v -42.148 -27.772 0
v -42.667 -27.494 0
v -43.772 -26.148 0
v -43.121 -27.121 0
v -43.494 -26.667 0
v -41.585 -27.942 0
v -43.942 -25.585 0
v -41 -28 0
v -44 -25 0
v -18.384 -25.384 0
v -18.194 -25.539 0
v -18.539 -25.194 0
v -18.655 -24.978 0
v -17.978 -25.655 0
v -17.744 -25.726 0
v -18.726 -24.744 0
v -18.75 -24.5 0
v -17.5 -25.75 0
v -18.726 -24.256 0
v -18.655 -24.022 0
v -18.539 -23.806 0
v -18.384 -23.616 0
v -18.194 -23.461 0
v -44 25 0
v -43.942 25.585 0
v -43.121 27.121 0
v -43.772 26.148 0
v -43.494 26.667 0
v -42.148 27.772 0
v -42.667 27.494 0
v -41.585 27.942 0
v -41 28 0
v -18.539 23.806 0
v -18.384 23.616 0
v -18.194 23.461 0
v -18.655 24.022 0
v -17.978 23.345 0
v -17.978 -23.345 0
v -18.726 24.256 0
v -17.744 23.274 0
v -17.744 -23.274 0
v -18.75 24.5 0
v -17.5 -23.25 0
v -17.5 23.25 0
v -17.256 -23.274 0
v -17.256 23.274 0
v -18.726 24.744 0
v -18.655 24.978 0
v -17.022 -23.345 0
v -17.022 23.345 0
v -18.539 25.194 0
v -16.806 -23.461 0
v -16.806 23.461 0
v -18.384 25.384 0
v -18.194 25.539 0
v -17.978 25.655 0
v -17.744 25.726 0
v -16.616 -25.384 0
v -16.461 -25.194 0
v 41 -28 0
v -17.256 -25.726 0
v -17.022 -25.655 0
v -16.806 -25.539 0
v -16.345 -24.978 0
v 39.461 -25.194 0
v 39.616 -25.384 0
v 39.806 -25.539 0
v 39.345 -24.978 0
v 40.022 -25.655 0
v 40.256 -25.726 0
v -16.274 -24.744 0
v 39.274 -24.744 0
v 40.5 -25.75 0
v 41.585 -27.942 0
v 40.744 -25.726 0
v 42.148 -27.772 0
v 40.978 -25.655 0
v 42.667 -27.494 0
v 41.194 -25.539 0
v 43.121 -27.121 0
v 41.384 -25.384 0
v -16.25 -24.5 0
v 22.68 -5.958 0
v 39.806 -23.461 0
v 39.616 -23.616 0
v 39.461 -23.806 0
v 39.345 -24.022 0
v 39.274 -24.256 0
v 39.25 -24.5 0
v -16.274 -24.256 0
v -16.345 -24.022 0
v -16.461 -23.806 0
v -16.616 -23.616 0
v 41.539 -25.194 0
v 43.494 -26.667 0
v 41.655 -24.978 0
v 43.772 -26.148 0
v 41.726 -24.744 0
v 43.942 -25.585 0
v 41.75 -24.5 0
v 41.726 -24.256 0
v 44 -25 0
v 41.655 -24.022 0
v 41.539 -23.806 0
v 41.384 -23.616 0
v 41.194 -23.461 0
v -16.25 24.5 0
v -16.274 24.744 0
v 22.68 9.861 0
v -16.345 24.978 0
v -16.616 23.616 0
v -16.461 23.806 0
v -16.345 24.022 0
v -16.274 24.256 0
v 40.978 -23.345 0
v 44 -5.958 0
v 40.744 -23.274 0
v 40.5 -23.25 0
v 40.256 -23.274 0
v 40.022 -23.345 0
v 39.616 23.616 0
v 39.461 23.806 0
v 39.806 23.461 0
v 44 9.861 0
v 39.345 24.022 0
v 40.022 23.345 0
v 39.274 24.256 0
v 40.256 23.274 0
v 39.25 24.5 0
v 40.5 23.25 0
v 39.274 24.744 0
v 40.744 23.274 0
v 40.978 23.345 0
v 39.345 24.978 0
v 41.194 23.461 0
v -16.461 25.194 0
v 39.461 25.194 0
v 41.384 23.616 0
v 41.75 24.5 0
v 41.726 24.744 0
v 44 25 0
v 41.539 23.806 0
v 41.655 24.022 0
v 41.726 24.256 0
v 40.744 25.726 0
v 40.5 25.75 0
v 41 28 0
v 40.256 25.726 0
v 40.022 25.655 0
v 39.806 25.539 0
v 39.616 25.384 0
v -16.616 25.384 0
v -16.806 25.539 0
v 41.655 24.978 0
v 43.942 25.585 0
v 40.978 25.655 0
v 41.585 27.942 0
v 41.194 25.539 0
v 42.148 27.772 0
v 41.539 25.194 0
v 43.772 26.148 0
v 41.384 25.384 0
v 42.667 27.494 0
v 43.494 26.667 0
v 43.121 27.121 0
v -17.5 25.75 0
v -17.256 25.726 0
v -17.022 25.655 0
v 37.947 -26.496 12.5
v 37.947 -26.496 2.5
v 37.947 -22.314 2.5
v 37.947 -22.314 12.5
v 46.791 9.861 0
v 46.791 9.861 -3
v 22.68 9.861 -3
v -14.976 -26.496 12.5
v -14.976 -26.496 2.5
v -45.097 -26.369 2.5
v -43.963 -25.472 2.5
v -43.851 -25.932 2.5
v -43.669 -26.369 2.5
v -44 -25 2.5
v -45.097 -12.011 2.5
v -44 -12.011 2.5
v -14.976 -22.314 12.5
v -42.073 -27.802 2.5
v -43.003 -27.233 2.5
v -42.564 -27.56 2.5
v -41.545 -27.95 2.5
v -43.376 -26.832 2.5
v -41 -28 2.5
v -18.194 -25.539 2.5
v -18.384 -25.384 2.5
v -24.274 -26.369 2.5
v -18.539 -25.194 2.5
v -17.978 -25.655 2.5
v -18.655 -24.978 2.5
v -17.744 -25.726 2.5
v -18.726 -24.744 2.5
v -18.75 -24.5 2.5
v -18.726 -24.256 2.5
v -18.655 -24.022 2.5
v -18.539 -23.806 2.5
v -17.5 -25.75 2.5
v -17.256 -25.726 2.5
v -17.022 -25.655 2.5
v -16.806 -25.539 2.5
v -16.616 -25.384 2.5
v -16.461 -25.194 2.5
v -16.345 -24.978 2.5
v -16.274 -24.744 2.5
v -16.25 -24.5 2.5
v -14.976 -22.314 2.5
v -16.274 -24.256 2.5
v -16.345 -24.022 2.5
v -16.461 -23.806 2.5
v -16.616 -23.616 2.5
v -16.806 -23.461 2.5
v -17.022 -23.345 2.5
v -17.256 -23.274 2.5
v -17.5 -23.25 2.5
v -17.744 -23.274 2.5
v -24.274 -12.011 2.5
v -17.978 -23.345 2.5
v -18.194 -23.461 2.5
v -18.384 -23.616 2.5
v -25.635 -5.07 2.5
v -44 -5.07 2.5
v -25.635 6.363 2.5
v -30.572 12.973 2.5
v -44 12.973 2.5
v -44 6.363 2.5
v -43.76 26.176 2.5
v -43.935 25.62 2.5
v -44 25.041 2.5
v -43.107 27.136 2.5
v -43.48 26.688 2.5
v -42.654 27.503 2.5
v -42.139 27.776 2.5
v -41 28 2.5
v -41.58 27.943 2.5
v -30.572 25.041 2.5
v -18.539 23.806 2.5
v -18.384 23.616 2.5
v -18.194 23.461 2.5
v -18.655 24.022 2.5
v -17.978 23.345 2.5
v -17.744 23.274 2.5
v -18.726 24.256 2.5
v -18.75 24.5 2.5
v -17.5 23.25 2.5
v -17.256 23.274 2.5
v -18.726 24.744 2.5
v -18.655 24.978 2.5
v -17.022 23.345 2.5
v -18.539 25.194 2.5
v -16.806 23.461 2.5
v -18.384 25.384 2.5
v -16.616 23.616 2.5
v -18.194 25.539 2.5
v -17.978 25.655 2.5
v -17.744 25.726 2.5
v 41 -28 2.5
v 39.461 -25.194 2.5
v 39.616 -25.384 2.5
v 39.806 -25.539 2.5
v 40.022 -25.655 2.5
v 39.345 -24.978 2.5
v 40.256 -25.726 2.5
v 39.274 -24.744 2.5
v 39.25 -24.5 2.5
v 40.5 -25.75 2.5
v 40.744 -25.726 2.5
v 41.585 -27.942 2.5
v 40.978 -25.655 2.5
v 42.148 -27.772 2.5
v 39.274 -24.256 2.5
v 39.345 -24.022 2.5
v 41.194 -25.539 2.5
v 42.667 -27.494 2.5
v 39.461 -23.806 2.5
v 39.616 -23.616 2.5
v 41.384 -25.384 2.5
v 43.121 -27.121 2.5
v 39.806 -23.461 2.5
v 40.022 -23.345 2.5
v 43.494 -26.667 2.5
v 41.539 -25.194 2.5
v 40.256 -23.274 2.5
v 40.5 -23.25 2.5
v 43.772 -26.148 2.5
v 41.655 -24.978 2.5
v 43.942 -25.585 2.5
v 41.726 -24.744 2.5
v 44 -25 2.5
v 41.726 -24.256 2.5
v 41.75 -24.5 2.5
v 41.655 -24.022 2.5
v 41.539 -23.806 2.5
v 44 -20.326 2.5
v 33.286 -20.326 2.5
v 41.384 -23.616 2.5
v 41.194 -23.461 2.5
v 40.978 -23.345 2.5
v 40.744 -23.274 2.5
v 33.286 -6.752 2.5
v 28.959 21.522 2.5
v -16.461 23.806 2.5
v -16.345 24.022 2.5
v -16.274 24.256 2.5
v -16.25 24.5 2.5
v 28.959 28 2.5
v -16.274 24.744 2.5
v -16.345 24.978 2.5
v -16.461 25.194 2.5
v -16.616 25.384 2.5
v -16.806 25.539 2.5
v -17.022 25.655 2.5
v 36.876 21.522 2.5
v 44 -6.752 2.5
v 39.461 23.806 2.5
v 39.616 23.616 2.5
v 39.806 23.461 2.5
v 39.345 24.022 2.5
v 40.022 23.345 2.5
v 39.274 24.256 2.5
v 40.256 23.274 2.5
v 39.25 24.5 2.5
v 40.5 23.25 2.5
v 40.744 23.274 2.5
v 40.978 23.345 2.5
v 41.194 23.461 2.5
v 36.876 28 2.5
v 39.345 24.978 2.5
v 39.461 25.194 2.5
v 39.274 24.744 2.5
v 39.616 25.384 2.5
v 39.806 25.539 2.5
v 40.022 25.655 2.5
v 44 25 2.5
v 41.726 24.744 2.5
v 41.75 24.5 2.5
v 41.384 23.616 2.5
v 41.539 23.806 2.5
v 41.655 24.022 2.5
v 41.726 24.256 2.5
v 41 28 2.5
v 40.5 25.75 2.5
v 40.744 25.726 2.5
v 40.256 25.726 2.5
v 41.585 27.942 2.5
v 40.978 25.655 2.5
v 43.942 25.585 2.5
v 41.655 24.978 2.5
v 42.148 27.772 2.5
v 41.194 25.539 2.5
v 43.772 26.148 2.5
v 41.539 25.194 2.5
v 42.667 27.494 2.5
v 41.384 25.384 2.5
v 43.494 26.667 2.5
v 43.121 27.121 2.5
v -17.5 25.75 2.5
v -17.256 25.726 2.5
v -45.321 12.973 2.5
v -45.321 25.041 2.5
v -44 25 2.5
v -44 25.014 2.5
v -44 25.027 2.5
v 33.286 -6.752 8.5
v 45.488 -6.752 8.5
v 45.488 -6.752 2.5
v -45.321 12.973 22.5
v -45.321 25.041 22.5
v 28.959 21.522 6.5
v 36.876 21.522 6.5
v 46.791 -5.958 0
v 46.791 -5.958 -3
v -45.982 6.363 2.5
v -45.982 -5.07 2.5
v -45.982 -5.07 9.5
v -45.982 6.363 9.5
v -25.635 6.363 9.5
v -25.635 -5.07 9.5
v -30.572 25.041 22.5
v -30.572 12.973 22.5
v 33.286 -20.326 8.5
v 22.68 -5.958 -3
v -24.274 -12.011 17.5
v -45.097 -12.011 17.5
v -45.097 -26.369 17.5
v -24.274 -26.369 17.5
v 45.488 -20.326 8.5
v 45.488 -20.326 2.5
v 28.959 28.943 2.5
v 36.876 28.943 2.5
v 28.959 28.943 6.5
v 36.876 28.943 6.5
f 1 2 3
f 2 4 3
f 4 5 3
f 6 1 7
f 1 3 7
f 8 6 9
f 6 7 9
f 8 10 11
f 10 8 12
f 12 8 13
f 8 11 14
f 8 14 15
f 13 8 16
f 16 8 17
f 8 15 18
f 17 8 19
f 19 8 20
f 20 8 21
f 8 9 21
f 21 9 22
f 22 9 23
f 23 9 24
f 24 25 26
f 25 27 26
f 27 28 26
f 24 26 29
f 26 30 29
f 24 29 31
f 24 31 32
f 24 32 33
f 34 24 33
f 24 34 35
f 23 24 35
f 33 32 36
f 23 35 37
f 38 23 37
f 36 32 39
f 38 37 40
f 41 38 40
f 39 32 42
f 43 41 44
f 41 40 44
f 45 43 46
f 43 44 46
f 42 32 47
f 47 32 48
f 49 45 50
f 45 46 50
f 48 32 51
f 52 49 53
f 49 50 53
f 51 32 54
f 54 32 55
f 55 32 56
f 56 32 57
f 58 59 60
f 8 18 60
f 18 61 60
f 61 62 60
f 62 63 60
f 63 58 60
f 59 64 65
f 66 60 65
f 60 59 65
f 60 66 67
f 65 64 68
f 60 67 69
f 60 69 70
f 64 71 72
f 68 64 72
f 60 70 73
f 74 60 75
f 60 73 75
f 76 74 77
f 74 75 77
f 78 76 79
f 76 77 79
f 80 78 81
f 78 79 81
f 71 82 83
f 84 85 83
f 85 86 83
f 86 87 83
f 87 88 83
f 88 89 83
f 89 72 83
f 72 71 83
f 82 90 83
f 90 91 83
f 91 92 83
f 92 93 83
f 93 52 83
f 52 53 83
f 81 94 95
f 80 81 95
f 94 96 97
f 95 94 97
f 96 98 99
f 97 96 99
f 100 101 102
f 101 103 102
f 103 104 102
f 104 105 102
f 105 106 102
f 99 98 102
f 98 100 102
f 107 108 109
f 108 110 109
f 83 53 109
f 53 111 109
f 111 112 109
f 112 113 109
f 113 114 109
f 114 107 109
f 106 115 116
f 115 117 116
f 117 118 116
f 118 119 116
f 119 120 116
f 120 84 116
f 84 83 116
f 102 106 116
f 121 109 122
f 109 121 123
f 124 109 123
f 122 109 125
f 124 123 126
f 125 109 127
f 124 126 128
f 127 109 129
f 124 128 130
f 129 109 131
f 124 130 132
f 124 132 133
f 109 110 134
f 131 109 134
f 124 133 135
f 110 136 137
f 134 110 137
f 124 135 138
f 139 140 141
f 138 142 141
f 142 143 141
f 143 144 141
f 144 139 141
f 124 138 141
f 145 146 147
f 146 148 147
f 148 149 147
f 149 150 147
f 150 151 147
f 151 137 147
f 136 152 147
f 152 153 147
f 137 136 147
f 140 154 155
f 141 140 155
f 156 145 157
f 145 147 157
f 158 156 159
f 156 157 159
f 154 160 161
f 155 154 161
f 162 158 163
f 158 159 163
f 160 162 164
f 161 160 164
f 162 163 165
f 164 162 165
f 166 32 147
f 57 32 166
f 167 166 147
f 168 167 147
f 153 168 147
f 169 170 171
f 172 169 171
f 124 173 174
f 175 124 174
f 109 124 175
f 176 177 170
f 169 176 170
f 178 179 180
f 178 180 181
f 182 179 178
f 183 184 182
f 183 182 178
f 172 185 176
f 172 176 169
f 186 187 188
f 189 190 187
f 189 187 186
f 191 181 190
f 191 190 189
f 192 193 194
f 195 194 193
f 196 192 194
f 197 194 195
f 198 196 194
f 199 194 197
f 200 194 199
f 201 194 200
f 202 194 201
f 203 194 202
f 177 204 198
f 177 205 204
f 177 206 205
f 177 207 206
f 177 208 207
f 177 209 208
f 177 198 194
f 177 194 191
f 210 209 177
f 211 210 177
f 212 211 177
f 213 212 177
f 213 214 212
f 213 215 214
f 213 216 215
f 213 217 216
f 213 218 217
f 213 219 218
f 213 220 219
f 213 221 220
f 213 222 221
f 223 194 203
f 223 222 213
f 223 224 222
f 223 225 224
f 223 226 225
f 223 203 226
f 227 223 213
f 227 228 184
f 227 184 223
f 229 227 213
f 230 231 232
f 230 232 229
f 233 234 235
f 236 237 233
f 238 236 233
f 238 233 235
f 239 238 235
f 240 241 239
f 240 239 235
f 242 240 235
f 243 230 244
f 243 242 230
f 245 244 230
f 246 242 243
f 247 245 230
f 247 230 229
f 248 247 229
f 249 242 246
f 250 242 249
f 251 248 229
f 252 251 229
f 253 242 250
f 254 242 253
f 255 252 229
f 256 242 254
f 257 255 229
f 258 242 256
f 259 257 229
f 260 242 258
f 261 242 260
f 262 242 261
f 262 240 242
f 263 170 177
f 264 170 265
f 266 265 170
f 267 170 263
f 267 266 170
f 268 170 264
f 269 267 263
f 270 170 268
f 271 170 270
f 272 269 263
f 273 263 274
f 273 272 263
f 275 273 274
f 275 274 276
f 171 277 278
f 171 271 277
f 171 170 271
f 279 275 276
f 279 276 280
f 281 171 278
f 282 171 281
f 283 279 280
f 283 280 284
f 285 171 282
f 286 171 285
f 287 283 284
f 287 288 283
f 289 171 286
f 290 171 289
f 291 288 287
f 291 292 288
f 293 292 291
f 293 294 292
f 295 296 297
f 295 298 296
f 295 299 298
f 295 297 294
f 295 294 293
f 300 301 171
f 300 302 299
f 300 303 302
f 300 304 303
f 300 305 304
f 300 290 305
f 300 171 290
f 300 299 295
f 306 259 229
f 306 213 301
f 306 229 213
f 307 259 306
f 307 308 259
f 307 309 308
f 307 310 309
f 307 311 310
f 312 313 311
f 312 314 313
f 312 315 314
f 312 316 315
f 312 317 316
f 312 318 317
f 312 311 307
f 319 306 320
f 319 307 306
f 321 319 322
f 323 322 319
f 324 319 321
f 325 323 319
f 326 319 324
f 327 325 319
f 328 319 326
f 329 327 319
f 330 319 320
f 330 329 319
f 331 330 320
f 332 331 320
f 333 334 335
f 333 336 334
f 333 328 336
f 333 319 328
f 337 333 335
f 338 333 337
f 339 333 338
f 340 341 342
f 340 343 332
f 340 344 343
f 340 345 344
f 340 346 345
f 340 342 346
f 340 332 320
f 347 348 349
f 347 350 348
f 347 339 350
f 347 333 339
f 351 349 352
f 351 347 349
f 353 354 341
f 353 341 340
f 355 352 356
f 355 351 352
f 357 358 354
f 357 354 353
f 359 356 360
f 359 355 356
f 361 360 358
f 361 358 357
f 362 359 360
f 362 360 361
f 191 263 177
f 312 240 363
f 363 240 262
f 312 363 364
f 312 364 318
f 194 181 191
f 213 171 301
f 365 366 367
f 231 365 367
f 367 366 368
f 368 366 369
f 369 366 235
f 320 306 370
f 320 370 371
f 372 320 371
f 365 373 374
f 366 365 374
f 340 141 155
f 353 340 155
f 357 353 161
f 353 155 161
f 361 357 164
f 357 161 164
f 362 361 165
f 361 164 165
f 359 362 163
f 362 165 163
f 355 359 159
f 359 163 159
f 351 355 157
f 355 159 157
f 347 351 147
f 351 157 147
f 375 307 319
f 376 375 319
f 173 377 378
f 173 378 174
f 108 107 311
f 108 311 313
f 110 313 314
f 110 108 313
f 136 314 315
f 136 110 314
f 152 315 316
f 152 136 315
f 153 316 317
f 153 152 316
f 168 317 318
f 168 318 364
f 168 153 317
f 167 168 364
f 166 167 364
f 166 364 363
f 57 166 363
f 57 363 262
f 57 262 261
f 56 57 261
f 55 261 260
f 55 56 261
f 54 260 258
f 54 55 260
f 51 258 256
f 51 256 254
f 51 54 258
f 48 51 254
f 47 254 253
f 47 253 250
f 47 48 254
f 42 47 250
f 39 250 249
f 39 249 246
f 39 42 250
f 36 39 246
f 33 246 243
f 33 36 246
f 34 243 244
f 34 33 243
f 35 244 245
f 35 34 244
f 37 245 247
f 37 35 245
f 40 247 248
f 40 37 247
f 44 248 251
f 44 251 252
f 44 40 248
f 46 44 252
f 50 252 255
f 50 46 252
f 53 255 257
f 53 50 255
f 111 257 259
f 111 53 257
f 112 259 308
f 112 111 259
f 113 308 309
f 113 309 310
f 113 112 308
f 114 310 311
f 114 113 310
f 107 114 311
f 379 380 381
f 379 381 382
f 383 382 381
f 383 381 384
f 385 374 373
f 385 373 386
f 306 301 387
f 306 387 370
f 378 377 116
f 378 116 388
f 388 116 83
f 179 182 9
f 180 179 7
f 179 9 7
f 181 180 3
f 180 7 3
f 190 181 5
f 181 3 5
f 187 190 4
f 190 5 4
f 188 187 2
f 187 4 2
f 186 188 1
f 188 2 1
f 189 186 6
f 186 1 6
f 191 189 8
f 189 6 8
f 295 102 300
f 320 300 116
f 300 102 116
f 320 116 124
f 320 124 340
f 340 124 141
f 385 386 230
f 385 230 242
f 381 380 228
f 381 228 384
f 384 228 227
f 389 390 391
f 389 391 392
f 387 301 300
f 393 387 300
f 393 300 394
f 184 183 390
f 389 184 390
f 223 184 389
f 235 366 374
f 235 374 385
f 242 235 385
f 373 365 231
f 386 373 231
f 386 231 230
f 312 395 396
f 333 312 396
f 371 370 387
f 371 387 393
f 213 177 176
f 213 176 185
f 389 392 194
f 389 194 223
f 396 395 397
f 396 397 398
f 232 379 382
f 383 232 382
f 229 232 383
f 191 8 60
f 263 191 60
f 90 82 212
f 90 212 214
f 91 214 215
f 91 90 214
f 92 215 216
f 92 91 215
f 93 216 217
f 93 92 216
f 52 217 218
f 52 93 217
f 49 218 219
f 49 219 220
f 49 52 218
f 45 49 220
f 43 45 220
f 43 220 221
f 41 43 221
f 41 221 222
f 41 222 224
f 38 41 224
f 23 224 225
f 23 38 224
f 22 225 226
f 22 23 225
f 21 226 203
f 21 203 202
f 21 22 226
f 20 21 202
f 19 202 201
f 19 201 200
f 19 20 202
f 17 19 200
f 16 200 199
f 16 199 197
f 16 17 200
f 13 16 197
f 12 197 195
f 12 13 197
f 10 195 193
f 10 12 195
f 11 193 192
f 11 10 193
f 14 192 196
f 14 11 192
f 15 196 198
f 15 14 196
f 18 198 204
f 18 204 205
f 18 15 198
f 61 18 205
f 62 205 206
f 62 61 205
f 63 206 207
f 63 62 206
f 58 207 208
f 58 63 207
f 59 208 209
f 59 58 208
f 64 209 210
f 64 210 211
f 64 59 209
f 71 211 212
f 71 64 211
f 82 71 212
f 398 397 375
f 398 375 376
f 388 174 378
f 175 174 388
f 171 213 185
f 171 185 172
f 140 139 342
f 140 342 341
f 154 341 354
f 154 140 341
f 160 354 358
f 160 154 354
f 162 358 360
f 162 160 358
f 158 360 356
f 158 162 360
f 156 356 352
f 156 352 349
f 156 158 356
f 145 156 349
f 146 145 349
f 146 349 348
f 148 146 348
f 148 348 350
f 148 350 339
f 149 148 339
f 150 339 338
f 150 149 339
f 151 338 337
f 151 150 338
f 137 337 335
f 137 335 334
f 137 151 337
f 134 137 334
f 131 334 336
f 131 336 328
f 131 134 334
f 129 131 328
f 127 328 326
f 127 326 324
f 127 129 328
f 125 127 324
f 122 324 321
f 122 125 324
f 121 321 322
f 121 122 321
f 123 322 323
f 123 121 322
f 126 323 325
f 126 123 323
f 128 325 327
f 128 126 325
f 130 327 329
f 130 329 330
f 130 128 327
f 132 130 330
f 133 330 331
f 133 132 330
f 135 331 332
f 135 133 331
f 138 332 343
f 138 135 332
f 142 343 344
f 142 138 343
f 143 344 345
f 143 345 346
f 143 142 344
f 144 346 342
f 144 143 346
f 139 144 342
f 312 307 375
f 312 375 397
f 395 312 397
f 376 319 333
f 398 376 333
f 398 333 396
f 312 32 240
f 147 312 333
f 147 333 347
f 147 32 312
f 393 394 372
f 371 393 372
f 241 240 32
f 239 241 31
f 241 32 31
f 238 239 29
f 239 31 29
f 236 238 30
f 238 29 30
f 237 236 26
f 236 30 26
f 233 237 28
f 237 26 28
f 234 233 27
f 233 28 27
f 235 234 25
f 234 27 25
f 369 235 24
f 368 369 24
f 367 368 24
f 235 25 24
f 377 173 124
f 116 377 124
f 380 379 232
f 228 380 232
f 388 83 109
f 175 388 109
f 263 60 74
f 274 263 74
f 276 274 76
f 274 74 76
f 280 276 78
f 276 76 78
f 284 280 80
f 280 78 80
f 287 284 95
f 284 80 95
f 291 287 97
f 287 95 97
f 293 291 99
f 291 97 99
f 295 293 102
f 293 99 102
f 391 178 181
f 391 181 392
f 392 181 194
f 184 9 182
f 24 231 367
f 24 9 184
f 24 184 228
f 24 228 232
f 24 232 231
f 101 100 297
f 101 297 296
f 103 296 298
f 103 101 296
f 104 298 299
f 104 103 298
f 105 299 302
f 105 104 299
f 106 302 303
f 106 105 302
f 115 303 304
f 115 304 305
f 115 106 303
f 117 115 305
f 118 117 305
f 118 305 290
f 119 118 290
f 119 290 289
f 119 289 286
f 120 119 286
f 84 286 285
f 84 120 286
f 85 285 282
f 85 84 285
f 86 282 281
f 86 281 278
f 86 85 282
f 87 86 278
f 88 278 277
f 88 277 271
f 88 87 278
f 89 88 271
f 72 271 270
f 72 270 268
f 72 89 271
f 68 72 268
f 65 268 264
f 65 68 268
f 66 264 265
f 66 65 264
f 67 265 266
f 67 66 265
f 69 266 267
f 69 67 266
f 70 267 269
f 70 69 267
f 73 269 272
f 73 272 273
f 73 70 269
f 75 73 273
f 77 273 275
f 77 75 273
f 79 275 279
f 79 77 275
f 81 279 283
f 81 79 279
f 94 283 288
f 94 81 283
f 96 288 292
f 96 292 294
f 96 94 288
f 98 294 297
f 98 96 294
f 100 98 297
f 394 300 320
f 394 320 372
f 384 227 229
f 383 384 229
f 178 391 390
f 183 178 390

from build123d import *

# Parameters (mm, degrees)
SKETCH_1_W      = 88
SKETCH_1_H      = 56
SKETCH_1_R      = 1.25
EXTRUDE_1_DEPTH = 2.5
SKETCH_3_W      = 14.749474834
SKETCH_3_H      = 12.067752137
EXTRUDE_2_DEPTH = 20
SKETCH_4_W      = 20.823165918
SKETCH_4_H      = 14.358457545
EXTRUDE_3_DEPTH = 15
SKETCH_5_W      = 20.346818985
SKETCH_5_H      = 11.432326386
EXTRUDE_4_DEPTH = 7
SKETCH_6_W      = 52.92270657
SKETCH_6_H      = 4.181716452
EXTRUDE_5_DEPTH = 10
SKETCH_7_W      = 12.202385712
SKETCH_7_H      = 13.573440286
EXTRUDE_6_DEPTH = 6
SKETCH_8_W      = 24.111474105
SKETCH_8_H      = 15.818799485
EXTRUDE_7_DEPTH = 3
SKETCH_9_W      = 7.916095885
SKETCH_9_H      = 7.421339892
EXTRUDE_8_DEPTH = 4
FILLET_1_R      = 3


with BuildPart() as part:
    # 草图1 → 凸台-拉伸1 (new body)
    with BuildSketch(Plane.XY):
        Rectangle(SKETCH_1_W, SKETCH_1_H)
        with Locations((-17.5, 24.5)):
            Circle(SKETCH_1_R, mode=Mode.SUBTRACT)
        with Locations((40.5, 24.5)):
            Circle(SKETCH_1_R, mode=Mode.SUBTRACT)
        with Locations((40.5, -24.5)):
            Circle(SKETCH_1_R, mode=Mode.SUBTRACT)
        with Locations((-17.5, -24.5)):
            Circle(SKETCH_1_R, mode=Mode.SUBTRACT)
    extrude(amount=EXTRUDE_1_DEPTH)

    # 草图3 → 凸台-拉伸2 (add)
    with BuildSketch(Plane.XY.offset(2.5)):
        with Locations((-37.946376164, 19.006709616)):
            Rectangle(SKETCH_3_W, SKETCH_3_H)
    extrude(amount=EXTRUDE_2_DEPTH)

    # 草图4 → 凸台-拉伸3 (add)
    with BuildSketch(Plane.XY.offset(2.5)):
        with Locations((-34.685337702, -19.189976435)):
            Rectangle(SKETCH_4_W, SKETCH_4_H)
    extrude(amount=EXTRUDE_3_DEPTH)

    # 草图5 → 凸台-拉伸4 (add)
    with BuildSketch(Plane.XY.offset(2.5)):
        with Locations((-35.808155473, 0.646470837)):
            Rectangle(SKETCH_5_W, SKETCH_5_H)
    extrude(amount=EXTRUDE_4_DEPTH)

    # 草图6 → 凸台-拉伸5 (add)
    with BuildSketch(Plane.XY.offset(2.5)):
        with Locations((11.485814144, -24.404771423)):
            Rectangle(SKETCH_6_W, SKETCH_6_H)
    extrude(amount=EXTRUDE_5_DEPTH)

    # 草图7 → 凸台-拉伸6 (add)
    with BuildSketch(Plane.XY.offset(2.5)):
        with Locations((39.386774732, -13.539163922)):
            Rectangle(SKETCH_7_W, SKETCH_7_H)
    extrude(amount=EXTRUDE_6_DEPTH)

    # 草图8 → 凸台-拉伸7 (add)
    with BuildSketch(Plane(origin=(0, 0, 0), x_dir=(-1, 0, 0), z_dir=(0, 0, -1))):
        with Locations((-34.735744668, 1.951217558)):
            Rectangle(SKETCH_8_W, SKETCH_8_H)
    extrude(amount=EXTRUDE_7_DEPTH)

    # 草图9 → 凸台-拉伸8 (add)
    with BuildSketch(Plane.XY.offset(2.5)):
        with Locations((32.917495051, 25.232555635)):
            Rectangle(SKETCH_9_W, SKETCH_9_H)
    extrude(amount=EXTRUDE_8_DEPTH)

    # 圆角1
    # the kernel refuses this fillet: 3 mm, written as the material it takes off along each edge
    with BuildSketch(Plane(origin=(44, -28, -7.5), x_dir=(-1, 0, 0), z_dir=(0, 0, 1)), Plane(origin=(44, 28, -7.5), x_dir=(0, -1, 0), z_dir=(0, 0, 1))) as fillet_1_piece_1:
        with BuildLine():
            CenterArc((FILLET_1_R, -FILLET_1_R), FILLET_1_R, 90, 90)
            Line((0, -FILLET_1_R), (0, 0))
            Line((0, 0), (FILLET_1_R, 0))
        make_face()
    extrude(amount=17.5, mode=Mode.SUBTRACT)
    with BuildSketch(Plane(origin=(-44, -28, -7.5), x_dir=(1, 0, 0), z_dir=(0, 0, 1)), Plane(origin=(-44, 28, -7.5), x_dir=(0, -1, 0), z_dir=(0, 0, 1))) as fillet_1_piece_2:
        with BuildLine():
            CenterArc((FILLET_1_R, FILLET_1_R), FILLET_1_R, 180, 90)
            Line((0, FILLET_1_R), (0, 0))
            Line((0, 0), (FILLET_1_R, 0))
        make_face()
    extrude(amount=10, mode=Mode.SUBTRACT)


solid = part.part
